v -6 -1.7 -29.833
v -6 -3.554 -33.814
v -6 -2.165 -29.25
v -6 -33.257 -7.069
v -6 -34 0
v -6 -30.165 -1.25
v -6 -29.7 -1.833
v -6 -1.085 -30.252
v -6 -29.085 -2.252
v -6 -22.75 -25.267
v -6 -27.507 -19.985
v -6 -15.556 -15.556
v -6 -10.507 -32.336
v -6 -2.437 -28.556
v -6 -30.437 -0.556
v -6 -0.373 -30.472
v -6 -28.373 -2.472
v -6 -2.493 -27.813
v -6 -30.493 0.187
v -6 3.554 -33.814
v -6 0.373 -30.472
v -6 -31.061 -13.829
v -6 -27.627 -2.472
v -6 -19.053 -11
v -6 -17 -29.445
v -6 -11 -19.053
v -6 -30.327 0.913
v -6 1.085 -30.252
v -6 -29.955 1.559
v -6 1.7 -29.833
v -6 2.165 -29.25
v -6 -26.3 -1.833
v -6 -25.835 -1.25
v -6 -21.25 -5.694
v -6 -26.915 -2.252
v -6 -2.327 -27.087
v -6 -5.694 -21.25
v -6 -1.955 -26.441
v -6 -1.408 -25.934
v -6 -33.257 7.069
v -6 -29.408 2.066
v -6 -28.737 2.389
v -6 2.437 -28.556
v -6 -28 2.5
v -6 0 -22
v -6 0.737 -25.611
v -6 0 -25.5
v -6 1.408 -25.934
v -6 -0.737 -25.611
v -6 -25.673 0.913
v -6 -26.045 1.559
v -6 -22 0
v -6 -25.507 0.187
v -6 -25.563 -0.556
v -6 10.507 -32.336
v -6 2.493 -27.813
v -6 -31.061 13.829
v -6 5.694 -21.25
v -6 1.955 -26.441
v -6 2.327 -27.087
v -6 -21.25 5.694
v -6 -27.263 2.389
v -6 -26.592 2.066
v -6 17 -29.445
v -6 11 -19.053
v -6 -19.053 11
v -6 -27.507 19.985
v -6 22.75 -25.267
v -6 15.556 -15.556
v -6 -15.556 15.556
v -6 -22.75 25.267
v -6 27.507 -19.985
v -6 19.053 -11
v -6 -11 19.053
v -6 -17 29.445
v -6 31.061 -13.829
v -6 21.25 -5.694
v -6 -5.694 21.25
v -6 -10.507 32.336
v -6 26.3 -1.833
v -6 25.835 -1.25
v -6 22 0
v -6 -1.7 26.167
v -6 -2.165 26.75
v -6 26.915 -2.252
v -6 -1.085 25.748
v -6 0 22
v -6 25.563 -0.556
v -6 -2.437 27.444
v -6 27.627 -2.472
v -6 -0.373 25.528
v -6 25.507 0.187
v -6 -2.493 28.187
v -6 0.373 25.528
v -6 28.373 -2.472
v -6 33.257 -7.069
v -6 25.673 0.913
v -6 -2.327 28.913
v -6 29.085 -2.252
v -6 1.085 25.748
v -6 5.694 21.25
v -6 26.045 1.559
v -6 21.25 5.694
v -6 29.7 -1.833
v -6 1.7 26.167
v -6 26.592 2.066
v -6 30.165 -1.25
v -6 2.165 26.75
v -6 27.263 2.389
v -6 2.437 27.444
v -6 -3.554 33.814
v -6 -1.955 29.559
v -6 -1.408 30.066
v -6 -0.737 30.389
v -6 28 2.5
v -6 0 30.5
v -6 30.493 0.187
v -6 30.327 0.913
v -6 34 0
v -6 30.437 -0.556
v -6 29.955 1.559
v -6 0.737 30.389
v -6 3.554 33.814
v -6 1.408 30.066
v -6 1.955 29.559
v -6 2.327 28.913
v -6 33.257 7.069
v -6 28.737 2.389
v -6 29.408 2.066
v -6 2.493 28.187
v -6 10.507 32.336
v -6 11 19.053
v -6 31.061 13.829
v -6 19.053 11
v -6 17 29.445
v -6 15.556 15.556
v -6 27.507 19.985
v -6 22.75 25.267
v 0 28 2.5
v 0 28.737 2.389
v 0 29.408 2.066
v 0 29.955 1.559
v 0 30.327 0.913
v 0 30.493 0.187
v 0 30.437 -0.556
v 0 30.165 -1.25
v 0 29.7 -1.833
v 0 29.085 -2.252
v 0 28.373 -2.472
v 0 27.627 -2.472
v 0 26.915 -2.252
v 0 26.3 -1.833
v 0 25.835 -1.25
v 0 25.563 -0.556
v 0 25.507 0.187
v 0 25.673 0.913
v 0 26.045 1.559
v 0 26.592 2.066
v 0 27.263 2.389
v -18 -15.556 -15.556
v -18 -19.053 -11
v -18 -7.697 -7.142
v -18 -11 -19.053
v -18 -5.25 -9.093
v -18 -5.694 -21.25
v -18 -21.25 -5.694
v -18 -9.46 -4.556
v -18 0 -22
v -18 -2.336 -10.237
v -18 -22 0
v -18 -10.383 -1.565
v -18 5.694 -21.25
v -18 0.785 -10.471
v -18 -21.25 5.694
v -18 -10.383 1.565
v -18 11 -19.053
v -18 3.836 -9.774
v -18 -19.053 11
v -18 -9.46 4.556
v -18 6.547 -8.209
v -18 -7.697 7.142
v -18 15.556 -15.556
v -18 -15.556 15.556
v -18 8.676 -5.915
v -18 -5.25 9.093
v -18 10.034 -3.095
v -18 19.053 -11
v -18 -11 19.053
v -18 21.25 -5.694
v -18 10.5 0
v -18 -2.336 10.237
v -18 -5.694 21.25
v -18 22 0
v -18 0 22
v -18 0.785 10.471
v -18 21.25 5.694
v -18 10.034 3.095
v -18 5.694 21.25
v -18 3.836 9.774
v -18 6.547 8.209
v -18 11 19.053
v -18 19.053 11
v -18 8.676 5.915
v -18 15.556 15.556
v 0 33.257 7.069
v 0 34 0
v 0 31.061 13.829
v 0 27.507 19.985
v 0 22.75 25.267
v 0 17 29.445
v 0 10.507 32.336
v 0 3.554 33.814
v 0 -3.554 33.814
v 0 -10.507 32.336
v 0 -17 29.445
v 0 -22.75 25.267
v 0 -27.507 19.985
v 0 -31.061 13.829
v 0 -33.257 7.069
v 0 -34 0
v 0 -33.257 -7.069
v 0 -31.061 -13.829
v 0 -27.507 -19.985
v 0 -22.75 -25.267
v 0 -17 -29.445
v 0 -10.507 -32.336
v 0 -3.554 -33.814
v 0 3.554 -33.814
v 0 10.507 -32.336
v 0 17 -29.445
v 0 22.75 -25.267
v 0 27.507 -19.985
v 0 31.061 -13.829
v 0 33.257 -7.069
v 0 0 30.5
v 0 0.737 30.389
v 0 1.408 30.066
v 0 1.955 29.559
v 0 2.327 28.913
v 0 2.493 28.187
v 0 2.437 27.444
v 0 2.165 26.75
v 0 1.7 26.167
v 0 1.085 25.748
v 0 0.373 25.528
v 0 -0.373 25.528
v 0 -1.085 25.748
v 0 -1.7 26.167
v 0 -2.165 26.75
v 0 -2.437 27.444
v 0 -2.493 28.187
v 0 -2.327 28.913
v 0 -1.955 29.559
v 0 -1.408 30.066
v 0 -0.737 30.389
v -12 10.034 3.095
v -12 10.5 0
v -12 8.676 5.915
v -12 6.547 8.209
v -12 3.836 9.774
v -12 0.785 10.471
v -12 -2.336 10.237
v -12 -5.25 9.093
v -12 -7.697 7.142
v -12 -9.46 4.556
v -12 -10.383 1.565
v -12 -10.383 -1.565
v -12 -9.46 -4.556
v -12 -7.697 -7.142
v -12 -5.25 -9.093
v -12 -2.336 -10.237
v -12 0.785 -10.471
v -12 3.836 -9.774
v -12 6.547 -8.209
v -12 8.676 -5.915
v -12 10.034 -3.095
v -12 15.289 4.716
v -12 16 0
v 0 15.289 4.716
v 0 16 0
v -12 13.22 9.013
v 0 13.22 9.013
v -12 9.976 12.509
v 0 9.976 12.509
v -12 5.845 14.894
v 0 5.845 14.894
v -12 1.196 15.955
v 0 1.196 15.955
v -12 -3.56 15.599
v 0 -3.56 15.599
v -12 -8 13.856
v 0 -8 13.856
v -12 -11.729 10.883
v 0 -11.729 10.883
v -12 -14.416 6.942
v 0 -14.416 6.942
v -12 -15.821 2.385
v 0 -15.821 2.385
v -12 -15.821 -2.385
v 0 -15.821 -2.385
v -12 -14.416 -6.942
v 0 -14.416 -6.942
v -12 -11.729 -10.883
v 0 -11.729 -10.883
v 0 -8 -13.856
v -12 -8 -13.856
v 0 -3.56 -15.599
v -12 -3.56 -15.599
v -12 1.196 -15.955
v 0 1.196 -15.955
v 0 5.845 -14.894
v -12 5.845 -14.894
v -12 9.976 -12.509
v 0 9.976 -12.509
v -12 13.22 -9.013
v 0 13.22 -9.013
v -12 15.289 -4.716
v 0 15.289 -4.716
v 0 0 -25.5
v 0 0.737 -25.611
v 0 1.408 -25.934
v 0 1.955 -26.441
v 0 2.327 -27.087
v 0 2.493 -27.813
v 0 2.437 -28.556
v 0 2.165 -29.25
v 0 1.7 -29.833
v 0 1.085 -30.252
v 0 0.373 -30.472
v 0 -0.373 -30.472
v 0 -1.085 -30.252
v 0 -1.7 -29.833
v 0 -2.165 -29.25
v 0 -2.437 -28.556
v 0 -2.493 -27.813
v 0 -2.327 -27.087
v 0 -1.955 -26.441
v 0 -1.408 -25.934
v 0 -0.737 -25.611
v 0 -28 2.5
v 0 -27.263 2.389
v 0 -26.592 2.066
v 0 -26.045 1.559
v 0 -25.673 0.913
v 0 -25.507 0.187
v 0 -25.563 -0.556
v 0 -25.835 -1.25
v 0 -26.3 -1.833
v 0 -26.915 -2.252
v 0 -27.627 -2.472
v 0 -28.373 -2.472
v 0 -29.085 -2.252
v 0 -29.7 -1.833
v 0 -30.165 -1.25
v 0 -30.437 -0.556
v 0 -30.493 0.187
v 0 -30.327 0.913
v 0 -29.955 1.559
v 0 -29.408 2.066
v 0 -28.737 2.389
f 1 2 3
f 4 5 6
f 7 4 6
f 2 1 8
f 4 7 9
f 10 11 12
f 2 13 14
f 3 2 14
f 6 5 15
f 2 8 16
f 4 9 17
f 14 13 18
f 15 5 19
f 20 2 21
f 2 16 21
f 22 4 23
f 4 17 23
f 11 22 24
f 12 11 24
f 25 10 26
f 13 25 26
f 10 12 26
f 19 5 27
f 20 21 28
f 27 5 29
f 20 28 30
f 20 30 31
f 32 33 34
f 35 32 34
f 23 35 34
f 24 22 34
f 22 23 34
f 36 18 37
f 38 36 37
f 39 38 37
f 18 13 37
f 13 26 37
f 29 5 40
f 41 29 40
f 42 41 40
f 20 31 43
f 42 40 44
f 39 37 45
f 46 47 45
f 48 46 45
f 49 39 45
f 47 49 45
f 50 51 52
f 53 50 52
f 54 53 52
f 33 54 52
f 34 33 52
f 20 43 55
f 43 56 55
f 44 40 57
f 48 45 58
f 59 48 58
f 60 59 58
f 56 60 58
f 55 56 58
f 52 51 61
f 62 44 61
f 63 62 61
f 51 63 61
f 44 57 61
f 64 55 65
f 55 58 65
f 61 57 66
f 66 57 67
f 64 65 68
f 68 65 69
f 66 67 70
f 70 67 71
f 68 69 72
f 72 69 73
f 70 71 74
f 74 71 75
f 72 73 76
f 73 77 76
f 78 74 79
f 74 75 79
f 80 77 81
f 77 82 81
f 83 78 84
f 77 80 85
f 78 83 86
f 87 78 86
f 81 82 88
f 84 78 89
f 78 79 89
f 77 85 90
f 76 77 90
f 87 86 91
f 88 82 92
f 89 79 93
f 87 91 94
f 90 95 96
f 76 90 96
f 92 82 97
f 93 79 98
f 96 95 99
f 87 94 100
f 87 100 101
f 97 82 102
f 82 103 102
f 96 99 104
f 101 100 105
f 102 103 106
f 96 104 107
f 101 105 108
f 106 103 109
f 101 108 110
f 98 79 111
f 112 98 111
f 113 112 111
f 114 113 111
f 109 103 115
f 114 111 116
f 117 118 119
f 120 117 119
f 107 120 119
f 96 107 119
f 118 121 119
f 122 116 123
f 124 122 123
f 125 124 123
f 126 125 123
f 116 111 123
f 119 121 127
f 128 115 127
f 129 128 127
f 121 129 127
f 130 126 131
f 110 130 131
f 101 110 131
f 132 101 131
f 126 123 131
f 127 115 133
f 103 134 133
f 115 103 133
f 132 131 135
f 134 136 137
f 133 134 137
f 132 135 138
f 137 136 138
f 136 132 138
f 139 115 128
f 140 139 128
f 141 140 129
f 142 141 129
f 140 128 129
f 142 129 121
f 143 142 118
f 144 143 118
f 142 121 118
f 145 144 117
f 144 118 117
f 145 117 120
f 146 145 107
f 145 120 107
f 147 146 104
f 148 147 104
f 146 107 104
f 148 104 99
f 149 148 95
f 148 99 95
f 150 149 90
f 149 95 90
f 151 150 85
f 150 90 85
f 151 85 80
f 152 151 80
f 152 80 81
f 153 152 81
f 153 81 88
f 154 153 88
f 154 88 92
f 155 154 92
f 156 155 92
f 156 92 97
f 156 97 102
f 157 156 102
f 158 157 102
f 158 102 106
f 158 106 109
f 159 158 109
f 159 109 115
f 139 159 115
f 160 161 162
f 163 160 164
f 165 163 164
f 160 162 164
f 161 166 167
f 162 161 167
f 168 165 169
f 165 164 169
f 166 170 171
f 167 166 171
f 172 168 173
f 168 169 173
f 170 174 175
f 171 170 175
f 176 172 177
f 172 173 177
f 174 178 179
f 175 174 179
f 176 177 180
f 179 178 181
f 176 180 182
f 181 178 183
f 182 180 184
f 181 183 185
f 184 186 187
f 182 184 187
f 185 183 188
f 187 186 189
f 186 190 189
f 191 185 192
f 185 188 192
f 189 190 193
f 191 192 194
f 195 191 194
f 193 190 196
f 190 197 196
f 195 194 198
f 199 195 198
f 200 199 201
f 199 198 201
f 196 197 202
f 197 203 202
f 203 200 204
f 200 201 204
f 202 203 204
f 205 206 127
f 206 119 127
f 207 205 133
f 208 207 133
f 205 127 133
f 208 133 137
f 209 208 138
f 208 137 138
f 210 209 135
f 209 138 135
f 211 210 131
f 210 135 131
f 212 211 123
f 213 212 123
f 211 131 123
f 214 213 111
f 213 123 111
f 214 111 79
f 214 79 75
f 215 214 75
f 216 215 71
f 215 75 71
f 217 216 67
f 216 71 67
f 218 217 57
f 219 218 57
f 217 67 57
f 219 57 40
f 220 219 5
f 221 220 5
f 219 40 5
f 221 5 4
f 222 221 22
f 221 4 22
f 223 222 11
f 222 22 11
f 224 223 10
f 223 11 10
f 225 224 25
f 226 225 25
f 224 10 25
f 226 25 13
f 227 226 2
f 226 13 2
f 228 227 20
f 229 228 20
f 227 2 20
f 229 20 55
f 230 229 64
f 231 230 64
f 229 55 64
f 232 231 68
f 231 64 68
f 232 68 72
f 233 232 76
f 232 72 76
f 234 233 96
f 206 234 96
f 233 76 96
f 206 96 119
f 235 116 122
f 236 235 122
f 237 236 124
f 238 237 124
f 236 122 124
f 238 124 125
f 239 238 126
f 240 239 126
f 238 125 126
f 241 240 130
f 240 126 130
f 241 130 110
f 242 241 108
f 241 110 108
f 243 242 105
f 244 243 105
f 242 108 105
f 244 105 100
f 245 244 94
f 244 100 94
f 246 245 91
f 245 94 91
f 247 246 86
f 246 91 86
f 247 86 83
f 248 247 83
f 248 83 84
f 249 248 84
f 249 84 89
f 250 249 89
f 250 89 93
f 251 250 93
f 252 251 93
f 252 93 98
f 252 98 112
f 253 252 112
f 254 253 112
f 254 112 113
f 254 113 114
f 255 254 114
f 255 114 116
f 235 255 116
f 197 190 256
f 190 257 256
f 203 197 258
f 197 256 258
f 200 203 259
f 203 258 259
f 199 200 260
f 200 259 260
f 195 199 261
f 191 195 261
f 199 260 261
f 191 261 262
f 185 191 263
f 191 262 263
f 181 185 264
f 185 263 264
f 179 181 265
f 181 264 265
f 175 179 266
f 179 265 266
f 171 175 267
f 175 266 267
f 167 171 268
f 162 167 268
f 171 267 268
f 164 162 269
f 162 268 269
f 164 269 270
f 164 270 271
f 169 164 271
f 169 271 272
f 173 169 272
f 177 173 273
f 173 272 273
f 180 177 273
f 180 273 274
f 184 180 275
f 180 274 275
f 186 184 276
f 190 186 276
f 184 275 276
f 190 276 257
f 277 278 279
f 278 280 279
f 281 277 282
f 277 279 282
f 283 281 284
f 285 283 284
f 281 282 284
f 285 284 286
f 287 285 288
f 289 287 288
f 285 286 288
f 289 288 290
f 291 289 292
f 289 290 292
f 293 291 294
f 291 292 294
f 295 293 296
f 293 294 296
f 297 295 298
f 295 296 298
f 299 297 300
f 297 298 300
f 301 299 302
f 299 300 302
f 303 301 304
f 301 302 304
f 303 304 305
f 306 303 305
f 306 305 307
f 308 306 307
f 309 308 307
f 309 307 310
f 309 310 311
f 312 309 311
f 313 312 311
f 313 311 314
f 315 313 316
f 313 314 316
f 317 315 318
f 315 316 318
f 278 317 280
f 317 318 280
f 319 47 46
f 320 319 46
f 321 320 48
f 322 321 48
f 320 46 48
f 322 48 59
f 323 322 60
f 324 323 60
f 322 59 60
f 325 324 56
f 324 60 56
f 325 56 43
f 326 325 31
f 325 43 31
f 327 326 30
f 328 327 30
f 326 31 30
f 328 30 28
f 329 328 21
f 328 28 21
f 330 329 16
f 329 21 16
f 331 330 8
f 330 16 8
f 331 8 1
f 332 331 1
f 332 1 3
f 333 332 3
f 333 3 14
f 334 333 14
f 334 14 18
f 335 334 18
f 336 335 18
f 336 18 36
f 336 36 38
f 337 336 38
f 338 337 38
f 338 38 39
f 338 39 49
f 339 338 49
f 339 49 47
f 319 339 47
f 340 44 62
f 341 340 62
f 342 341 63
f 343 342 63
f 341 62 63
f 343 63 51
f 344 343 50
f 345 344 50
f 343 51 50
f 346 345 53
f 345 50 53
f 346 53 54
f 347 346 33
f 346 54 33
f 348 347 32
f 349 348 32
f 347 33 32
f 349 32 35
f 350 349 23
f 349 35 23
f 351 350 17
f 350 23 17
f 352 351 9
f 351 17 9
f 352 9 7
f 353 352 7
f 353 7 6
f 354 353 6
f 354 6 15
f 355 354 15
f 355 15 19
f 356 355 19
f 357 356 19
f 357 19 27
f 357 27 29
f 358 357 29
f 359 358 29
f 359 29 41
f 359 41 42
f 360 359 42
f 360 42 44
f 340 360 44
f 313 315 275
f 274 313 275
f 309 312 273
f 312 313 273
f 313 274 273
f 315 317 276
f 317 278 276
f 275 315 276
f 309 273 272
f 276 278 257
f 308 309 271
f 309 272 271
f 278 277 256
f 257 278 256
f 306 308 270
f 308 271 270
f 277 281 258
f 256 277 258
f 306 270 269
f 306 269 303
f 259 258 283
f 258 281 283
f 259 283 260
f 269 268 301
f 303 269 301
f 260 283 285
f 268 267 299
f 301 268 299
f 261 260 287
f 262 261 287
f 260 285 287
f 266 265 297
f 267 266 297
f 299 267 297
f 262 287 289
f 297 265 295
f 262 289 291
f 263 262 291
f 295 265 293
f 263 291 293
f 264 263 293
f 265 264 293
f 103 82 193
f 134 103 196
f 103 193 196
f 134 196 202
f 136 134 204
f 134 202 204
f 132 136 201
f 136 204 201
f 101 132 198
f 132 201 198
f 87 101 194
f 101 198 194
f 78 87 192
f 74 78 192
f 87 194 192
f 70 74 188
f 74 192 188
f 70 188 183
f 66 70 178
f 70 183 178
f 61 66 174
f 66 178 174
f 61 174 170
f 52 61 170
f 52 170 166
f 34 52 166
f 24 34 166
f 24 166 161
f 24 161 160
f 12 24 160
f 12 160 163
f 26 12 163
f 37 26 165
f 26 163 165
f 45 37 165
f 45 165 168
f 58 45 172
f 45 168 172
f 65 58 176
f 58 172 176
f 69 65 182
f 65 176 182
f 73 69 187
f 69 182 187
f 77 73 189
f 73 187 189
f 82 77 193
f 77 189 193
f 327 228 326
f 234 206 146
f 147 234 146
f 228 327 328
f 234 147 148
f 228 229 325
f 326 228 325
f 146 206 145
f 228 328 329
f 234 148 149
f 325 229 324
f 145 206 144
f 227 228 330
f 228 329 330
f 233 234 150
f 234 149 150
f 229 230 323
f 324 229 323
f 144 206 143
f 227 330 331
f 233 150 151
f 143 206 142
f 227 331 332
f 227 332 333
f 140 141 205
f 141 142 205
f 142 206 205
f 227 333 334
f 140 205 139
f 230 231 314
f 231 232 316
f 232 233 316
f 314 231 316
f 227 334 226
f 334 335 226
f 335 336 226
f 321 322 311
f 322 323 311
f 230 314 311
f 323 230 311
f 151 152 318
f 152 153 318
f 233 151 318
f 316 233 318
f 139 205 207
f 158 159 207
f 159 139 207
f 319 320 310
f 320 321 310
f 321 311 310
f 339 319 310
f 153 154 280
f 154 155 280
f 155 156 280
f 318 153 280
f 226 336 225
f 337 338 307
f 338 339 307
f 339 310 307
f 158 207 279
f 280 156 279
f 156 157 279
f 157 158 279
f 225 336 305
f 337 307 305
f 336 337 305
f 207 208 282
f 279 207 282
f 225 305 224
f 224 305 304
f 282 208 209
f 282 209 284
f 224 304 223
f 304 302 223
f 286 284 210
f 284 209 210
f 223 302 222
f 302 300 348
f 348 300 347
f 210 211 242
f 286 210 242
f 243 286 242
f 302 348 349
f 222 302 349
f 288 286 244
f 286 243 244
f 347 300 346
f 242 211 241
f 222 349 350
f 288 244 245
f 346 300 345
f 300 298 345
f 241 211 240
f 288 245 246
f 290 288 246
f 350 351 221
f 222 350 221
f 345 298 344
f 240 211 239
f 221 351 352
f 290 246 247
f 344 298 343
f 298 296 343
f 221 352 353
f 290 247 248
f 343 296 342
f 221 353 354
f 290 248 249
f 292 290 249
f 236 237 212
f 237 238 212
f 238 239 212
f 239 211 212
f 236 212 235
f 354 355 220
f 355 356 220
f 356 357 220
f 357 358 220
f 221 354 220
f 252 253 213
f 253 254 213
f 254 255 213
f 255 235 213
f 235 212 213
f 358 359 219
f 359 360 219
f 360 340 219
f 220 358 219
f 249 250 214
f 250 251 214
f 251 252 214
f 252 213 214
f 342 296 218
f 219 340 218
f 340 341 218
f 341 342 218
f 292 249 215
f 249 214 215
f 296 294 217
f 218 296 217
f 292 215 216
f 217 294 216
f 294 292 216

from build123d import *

# Parameters (mm, degrees)
SKETCH2_R          = 2.5
CUT_EXTRUDE1_DEPTH = 7


with BuildPart() as part:
    # Sketch1 → Revolve1 (revolve)
    with BuildSketch(Plane.XY):
        Polygon((0, 16), (0, 34), (-6, 34), (-6, 22), (-18, 22), (-18, 10.5), (-12, 10.5), (-12, 16), align=None)
    revolve(axis=Axis((-41.962696156, 0, 0), (1, 0, 0)))

    # Sketch2 → Cut-Extrude1 (cut, through all)
    with BuildSketch(Plane.ZY.offset(6)):
        with Locations((0, 28)):
            Circle(SKETCH2_R)
        with Locations((28, 0)):
            Circle(SKETCH2_R)
        with Locations((0, -28)):
            Circle(SKETCH2_R)
        with Locations((-28, 0)):
            Circle(SKETCH2_R)
    extrude(amount=-CUT_EXTRUDE1_DEPTH, mode=Mode.SUBTRACT)


solid = part.part
